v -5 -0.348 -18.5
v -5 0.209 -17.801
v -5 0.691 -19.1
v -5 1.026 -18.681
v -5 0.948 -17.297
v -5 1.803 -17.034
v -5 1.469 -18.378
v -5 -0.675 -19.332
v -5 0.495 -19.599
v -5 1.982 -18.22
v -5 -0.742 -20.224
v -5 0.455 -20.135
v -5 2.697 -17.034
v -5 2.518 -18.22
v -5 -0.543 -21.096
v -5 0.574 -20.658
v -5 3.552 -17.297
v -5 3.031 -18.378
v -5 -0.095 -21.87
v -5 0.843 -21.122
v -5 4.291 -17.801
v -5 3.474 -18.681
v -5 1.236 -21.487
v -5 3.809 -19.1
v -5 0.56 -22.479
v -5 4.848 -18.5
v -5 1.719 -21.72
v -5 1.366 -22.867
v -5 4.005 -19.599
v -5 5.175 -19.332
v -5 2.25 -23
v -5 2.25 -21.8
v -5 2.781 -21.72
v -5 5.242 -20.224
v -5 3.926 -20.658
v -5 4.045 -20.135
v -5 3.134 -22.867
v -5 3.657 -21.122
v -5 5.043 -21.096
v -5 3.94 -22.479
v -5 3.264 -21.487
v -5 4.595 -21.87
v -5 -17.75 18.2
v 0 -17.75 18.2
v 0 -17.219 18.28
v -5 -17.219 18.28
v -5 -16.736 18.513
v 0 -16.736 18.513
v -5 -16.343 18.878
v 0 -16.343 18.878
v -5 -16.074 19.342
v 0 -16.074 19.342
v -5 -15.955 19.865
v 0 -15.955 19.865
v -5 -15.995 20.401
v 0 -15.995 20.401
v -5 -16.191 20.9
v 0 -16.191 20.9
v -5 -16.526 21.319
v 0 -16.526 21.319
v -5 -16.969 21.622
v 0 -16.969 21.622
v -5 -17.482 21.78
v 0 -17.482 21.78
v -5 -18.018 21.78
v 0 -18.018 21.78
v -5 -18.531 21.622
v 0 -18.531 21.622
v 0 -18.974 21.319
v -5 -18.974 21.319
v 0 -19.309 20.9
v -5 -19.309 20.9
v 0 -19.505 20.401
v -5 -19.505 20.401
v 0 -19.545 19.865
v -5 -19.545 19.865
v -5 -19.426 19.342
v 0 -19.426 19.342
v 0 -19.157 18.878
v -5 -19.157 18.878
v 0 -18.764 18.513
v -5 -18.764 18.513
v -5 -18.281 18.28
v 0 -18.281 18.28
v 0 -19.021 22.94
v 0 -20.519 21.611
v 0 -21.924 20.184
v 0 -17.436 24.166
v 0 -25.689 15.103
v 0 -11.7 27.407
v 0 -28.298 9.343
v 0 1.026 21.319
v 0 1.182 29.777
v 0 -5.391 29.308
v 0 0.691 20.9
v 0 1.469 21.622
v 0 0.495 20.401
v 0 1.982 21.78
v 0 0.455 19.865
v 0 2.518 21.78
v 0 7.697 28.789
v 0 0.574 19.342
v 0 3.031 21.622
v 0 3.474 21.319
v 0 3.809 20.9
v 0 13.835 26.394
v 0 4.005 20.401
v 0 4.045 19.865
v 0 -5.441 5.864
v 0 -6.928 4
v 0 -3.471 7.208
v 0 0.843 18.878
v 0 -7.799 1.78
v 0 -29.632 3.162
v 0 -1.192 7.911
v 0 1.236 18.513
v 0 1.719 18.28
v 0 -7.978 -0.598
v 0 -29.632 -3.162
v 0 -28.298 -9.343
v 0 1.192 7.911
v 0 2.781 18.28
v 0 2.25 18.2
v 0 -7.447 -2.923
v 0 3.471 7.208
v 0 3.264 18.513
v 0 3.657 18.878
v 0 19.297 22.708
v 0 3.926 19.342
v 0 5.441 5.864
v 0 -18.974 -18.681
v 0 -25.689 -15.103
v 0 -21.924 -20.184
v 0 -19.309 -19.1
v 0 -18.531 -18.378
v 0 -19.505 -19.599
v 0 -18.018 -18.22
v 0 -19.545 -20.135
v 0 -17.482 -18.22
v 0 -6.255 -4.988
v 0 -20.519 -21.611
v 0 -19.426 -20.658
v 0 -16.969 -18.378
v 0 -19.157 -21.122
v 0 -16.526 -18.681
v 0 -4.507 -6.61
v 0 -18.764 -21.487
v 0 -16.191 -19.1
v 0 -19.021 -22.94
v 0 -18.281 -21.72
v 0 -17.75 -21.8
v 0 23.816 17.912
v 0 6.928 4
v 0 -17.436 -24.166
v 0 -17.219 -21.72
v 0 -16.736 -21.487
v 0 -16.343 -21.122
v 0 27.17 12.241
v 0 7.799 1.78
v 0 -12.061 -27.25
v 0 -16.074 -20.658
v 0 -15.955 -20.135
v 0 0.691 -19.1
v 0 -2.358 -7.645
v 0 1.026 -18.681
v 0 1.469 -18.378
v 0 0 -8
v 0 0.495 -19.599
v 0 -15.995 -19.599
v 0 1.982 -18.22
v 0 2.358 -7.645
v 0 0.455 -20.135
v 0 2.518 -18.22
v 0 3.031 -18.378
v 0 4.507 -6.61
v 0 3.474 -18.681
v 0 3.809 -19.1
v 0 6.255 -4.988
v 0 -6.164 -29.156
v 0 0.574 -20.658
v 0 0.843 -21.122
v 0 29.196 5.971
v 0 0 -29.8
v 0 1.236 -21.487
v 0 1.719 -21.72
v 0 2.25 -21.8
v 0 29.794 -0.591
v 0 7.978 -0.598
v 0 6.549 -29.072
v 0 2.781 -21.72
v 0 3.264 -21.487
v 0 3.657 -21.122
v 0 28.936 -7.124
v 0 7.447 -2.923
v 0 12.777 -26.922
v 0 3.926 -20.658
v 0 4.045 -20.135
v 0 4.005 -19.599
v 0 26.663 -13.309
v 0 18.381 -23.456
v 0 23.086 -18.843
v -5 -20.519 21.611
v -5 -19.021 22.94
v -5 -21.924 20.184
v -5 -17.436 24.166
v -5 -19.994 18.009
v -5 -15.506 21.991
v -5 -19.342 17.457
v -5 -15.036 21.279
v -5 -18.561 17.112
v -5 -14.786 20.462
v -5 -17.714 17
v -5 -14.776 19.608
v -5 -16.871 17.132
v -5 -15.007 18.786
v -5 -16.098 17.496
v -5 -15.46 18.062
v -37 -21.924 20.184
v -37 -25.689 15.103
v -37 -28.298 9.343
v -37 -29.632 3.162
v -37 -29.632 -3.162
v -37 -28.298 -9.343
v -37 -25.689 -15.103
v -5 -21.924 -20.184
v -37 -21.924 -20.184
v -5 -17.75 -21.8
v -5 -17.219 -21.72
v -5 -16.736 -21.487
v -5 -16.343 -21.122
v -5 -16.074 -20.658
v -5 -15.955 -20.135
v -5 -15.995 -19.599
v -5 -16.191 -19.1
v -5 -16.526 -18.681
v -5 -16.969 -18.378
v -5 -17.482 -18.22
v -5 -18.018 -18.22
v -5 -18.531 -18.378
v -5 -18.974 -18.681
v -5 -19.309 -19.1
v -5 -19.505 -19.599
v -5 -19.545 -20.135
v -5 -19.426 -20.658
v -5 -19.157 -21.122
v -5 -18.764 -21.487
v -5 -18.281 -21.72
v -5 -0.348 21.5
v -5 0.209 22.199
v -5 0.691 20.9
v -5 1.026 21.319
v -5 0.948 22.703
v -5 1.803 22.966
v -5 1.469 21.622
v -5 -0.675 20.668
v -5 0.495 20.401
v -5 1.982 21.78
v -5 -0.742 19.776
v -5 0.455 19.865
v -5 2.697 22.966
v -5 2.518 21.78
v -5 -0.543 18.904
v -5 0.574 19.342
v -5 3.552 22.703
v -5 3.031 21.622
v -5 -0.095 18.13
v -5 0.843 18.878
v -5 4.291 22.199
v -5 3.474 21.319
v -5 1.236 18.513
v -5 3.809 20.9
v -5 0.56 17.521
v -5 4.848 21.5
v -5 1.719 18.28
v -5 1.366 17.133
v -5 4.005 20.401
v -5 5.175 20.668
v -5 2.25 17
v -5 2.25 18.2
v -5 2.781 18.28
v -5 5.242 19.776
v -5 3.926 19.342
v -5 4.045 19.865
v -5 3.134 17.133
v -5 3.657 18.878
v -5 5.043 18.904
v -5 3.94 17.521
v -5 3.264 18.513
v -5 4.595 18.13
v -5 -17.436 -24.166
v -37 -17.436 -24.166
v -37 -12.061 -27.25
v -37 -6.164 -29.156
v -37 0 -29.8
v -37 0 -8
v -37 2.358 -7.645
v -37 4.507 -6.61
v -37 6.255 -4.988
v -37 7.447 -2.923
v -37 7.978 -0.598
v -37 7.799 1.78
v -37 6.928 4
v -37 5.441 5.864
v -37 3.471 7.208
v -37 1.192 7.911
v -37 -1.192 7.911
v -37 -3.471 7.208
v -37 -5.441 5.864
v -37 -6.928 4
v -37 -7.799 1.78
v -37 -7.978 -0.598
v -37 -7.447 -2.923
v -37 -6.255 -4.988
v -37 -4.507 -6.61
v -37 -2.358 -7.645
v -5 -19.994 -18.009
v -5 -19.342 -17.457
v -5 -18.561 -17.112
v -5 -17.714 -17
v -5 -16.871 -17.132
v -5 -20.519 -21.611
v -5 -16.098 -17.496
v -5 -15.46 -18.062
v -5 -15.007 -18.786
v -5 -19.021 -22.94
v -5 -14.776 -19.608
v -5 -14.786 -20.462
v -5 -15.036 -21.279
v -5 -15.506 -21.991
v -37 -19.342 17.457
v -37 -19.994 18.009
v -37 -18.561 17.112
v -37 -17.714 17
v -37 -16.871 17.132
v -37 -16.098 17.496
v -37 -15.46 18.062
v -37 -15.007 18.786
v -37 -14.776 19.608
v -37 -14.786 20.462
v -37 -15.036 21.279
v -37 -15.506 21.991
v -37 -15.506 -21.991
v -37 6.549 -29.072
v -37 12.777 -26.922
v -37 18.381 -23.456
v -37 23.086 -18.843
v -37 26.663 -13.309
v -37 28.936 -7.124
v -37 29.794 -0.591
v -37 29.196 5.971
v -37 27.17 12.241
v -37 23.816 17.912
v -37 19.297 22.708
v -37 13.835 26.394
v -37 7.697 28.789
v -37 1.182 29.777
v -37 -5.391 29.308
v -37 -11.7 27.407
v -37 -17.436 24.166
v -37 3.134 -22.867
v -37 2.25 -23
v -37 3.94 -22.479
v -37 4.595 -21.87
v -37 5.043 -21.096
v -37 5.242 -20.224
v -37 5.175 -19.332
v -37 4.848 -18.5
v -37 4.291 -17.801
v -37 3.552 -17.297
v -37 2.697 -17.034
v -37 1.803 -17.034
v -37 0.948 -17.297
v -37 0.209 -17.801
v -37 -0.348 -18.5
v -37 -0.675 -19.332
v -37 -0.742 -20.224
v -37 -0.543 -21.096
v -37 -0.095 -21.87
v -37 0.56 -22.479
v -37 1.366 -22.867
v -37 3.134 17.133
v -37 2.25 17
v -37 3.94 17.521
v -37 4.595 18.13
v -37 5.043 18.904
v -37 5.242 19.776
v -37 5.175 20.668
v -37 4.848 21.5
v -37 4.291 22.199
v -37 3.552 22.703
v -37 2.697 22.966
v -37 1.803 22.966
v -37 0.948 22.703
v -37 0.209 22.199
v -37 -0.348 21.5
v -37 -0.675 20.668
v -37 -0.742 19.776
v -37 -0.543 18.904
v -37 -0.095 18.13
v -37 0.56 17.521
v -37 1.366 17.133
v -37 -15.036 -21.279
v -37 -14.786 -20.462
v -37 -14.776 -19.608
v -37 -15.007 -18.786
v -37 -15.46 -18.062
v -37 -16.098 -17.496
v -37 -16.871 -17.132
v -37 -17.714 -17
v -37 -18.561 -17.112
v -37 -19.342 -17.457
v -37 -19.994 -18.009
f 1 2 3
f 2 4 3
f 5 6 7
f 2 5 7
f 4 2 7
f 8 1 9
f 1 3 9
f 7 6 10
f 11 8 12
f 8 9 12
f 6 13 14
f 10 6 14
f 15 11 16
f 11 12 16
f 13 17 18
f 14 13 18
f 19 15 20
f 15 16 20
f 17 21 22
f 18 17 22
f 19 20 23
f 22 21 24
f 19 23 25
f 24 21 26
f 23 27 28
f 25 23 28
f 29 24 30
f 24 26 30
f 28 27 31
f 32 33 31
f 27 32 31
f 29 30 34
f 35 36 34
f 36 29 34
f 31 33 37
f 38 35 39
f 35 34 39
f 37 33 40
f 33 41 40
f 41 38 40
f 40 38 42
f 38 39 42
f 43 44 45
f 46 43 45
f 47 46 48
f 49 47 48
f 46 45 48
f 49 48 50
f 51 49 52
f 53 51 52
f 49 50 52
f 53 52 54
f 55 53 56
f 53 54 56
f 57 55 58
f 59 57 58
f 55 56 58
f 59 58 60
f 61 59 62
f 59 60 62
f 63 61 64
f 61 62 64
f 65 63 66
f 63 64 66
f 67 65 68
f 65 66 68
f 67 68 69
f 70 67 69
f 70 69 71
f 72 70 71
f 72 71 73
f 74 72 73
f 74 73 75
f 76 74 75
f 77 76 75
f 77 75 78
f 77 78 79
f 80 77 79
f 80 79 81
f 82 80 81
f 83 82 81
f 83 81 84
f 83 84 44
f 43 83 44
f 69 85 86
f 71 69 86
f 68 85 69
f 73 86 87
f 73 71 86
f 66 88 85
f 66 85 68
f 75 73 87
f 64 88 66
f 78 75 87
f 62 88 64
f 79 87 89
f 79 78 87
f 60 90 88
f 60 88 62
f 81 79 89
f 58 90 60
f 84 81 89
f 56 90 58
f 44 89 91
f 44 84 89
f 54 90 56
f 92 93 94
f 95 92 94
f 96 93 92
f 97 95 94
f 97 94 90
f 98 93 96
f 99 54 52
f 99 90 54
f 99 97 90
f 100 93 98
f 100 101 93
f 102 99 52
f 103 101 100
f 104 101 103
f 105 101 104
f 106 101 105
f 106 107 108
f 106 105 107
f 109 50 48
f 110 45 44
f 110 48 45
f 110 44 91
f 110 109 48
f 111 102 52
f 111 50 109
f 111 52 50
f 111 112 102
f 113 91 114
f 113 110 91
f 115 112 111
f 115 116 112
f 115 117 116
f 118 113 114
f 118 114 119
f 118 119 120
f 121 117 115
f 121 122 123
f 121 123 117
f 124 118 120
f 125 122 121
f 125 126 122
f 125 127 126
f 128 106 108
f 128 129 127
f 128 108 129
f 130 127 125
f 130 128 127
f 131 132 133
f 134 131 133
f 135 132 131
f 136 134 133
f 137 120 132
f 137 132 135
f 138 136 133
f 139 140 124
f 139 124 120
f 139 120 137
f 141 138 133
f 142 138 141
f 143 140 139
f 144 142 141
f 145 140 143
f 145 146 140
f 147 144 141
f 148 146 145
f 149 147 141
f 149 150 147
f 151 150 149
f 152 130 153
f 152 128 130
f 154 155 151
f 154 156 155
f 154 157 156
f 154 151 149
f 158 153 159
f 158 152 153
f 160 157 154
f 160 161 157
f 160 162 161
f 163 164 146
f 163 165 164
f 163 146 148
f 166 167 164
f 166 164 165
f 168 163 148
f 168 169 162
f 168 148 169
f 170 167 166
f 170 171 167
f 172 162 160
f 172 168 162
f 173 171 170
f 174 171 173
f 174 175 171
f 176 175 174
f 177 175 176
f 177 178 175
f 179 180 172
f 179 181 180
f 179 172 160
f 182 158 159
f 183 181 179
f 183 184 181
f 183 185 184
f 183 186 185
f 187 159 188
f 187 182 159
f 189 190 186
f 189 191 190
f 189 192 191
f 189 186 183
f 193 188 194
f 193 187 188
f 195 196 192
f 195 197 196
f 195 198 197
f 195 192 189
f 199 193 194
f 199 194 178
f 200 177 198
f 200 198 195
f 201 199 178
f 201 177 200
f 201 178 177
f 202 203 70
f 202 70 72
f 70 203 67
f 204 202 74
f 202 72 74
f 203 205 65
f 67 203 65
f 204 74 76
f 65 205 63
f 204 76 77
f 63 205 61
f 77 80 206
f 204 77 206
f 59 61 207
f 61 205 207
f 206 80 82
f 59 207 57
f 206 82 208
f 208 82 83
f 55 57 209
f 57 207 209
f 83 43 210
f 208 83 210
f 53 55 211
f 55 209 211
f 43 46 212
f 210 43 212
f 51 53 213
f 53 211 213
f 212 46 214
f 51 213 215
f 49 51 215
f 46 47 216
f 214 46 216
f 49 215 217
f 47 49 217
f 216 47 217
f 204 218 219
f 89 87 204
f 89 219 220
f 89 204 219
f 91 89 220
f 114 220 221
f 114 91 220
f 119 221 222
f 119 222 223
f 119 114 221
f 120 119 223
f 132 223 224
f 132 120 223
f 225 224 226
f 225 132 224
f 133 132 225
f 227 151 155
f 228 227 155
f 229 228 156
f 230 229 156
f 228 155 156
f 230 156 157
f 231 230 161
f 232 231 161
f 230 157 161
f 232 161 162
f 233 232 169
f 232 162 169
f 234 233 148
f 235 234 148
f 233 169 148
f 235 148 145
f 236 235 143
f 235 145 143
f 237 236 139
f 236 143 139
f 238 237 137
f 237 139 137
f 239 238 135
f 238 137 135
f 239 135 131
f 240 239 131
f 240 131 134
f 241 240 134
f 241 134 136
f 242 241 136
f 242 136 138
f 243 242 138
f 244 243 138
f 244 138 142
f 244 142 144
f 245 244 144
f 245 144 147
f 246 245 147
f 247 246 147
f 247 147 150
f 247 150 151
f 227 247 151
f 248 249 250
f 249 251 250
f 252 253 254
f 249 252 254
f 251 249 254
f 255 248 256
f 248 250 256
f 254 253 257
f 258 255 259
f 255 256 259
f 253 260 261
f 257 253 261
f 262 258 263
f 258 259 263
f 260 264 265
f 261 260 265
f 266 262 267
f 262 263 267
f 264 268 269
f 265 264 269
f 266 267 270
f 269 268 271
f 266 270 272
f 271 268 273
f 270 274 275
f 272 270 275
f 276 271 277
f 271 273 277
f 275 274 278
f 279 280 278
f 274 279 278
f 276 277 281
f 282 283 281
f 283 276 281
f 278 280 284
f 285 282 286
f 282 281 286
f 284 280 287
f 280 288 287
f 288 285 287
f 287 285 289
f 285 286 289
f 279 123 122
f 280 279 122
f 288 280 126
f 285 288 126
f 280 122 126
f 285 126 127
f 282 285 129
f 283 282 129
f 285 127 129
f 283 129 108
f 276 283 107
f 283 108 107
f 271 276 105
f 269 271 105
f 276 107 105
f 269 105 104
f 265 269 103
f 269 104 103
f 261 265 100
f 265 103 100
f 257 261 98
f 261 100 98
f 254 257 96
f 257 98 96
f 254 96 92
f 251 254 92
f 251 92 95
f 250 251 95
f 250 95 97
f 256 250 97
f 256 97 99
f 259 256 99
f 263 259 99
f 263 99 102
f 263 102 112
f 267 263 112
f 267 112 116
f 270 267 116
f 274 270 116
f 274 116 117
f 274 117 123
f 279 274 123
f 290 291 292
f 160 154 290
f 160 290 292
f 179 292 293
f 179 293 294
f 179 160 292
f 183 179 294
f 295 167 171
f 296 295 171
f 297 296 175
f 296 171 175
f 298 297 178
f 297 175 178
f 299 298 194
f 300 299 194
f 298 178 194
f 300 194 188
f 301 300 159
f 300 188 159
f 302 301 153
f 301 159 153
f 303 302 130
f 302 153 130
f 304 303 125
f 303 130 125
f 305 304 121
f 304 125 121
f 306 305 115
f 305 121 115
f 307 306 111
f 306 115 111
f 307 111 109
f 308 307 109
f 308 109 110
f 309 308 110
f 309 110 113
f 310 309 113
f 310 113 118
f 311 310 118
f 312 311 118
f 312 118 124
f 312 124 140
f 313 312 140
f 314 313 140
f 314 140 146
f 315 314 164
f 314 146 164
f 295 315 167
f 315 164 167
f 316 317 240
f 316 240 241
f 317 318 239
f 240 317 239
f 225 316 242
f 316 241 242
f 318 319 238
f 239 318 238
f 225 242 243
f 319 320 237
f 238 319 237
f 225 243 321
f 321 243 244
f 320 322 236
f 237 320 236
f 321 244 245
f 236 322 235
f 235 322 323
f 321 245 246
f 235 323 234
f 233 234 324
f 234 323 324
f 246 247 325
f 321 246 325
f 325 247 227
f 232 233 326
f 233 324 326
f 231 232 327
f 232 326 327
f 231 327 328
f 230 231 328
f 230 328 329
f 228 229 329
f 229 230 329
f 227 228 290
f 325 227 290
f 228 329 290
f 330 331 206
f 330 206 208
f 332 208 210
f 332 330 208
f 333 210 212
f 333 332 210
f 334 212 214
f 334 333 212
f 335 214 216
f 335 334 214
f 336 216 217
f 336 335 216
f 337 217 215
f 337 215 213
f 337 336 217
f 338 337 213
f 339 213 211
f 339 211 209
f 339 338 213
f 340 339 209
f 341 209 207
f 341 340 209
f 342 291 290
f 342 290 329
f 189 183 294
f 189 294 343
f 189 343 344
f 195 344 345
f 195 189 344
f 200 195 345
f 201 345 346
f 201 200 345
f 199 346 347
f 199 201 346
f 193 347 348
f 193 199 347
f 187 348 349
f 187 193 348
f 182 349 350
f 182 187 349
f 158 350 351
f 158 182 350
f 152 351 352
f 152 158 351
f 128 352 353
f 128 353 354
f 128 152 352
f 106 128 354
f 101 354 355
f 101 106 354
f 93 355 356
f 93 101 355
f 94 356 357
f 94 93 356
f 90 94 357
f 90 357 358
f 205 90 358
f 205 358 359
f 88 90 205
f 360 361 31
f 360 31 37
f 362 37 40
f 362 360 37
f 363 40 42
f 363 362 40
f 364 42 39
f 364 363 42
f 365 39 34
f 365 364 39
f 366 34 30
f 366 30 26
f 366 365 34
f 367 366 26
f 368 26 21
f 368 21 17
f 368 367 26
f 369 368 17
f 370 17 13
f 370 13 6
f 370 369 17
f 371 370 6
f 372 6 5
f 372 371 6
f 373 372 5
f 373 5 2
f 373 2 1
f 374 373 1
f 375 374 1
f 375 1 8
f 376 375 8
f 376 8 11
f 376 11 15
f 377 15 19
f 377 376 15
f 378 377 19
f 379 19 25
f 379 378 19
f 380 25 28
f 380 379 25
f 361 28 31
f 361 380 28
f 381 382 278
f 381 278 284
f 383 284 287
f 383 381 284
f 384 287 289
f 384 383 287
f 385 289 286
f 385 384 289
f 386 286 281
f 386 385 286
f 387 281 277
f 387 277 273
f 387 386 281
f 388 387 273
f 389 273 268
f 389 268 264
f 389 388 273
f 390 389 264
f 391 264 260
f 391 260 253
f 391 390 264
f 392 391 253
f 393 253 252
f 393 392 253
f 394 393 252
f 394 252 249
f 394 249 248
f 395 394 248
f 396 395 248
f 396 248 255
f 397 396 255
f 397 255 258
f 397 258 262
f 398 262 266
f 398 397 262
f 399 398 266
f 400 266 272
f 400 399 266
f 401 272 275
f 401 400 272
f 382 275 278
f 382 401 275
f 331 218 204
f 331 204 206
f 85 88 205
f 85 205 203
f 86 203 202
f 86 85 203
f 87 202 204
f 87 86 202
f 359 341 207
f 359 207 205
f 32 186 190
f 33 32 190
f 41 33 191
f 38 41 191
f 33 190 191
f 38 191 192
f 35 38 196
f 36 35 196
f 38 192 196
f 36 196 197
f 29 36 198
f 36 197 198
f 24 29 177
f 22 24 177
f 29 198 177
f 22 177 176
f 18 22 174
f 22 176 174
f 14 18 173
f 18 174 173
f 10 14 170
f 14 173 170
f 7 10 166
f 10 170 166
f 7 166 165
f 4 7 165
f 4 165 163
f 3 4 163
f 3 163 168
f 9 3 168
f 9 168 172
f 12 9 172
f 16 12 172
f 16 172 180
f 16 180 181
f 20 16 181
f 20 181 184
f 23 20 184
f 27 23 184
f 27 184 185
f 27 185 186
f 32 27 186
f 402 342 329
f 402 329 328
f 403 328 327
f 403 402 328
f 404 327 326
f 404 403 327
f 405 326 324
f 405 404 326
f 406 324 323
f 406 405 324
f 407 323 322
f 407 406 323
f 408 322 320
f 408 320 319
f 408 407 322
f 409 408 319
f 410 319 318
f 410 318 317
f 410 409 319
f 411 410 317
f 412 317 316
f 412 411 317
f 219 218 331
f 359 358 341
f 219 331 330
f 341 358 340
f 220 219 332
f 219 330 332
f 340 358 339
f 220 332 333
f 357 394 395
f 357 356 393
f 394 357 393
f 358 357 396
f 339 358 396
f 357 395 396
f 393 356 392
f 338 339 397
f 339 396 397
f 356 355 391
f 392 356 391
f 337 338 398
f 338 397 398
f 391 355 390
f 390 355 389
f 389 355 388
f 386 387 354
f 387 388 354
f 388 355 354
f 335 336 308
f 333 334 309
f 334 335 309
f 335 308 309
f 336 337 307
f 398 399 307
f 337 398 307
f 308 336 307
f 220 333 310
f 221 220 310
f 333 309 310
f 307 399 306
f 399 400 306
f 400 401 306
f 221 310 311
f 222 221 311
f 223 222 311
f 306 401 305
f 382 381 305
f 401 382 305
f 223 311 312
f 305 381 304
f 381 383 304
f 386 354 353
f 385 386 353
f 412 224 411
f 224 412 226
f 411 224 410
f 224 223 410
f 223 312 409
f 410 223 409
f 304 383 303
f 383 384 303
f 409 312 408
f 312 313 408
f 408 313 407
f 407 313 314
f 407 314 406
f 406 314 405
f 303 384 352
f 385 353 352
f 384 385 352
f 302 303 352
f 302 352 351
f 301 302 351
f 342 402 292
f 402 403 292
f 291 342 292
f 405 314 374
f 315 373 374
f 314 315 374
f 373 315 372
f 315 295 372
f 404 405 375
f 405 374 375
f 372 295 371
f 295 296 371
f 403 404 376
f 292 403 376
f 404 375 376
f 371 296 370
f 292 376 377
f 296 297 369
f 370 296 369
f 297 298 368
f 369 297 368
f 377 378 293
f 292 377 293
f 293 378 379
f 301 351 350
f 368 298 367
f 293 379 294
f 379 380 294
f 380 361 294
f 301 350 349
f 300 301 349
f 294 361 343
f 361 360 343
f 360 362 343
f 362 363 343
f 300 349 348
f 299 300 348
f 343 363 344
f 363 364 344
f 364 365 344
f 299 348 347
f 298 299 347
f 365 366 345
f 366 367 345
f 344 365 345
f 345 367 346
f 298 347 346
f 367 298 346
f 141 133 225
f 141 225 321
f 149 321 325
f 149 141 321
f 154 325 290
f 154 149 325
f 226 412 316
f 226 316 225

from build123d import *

# Parameters (mm, degrees)
SKETCH2_R            = 3
SKETCH2_R_2          = 8
BOSS_EXTRUDE1_DEPTH  = 37
M4_CLEARANCE_HOLE1_D = 3.6
CUT_EXTRUDE1_START   = -37
SKETCH2_3_R          = 3
CUT_EXTRUDE1_DEPTH   = 32


with BuildPart() as part:
    # Sketch2 → Boss-Extrude1 (new body)
    # profile 1 of 5: a face of its own
    with BuildSketch(Plane(origin=(0, 0, 0), x_dir=(0, 0, -1), z_dir=(1, 0, 0))):
        with BuildLine():
            Line((-24.16628289, -17.436478179), (-21.991350056, -15.506225289))
            ThreePointArc((-21.991350056, -15.506225289), (-17.756225289, -15.758649944), (-18.008649944, -19.993774711))
            Line((-18.008649944, -19.993774711), (-20.183582778, -21.924027601))
            ThreePointArc((-20.183582778, -21.924027601), (0, -29.8), (20.183582778, -21.924027601))
            Line((20.183582778, -21.924027601), (18.008649944, -19.993774711))
            ThreePointArc((18.008649944, -19.993774711), (17.756225289, -15.758649944), (21.991350056, -15.506225289))
            Line((21.991350056, -15.506225289), (24.16628289, -17.436478179))
            ThreePointArc((24.16628289, -17.436478179), (28.356615014, -9.162007692), (29.8, 0))
            ThreePointArc((29.8, 0), (-9.162007692, 28.356615014), (-24.16628289, -17.436478179))
        make_face()
        with Locations((-20, 2.25)):
            Circle(SKETCH2_R, mode=Mode.SUBTRACT)
        Circle(SKETCH2_R_2, mode=Mode.SUBTRACT)
        with Locations((20, 2.25)):
            Circle(SKETCH2_R, mode=Mode.SUBTRACT)
    # profile 2 of 5: a face of its own
    with BuildSketch(Plane(origin=(0, 0, 0), x_dir=(0, 0, -1), z_dir=(1, 0, 0))):
        with Locations((20, 2.25)):
            Circle(SKETCH2_R)
    # profile 3 of 5: a face of its own
    with BuildSketch(Plane(origin=(0, 0, 0), x_dir=(0, 0, -1), z_dir=(1, 0, 0))):
        with Locations((-20, 2.25)):
            Circle(SKETCH2_R)
    # profile 4 of 5: a face of its own
    with BuildSketch(Plane(origin=(0, 0, 0), x_dir=(0, 0, -1), z_dir=(1, 0, 0))):
        with BuildLine():
            ThreePointArc((20.183582778, -21.924027601), (22.28816213, -19.78074389), (24.16628289, -17.436478179))
            Line((24.16628289, -17.436478179), (21.991350056, -15.506225289))
            ThreePointArc((21.991350056, -15.506225289), (17.756225289, -15.758649944), (18.008649944, -19.993774711))
            Line((18.008649944, -19.993774711), (20.183582778, -21.924027601))
        make_face()
    # profile 5 of 5: a face of its own
    with BuildSketch(Plane(origin=(0, 0, 0), x_dir=(0, 0, -1), z_dir=(1, 0, 0))):
        with BuildLine():
            ThreePointArc((-18.008649944, -19.993774711), (-17.756225289, -15.758649944), (-21.991350056, -15.506225289))
            Line((-21.991350056, -15.506225289), (-24.16628289, -17.436478179))
            ThreePointArc((-24.16628289, -17.436478179), (-22.28816213, -19.78074389), (-20.183582778, -21.924027601))
            Line((-20.183582778, -21.924027601), (-18.008649944, -19.993774711))
        make_face()
    extrude(amount=-BOSS_EXTRUDE1_DEPTH)

    # M4 Clearance Hole1 (through all)
    with Locations(Plane.ZY.offset(37)):
        with Locations((-20, 2.25), (20, 2.25), (20, -17.75), (-20, -17.75)):
            Hole(M4_CLEARANCE_HOLE1_D / 2)

    # Sketch2<3> → Cut-Extrude1 (cut)
    with BuildSketch(Plane(origin=(0, 0, 0), x_dir=(0, 0, -1), z_dir=(1, 0, 0)).offset(CUT_EXTRUDE1_START)):
        with Locations((20, 2.25)):
            Circle(SKETCH2_3_R)
        with Locations((-20, 2.25)):
            Circle(SKETCH2_3_R)
        with BuildLine():
            ThreePointArc((-18.008649944, -19.993774711), (-17.756225289, -15.758649944), (-21.991350056, -15.506225289))
            Line((-21.991350056, -15.506225289), (-24.16628289, -17.436478179))
            ThreePointArc((-24.16628289, -17.436478179), (-22.28816213, -19.78074389), (-20.183582778, -21.924027601))
            Line((-20.183582778, -21.924027601), (-18.008649944, -19.993774711))
        make_face()
        with BuildLine():
            ThreePointArc((20.183582778, -21.924027601), (22.28816213, -19.78074389), (24.16628289, -17.436478179))
            Line((24.16628289, -17.436478179), (21.991350056, -15.506225289))
            ThreePointArc((21.991350056, -15.506225289), (17.756225289, -15.758649944), (18.008649944, -19.993774711))
            Line((18.008649944, -19.993774711), (20.183582778, -21.924027601))
        make_face()
    extrude(amount=CUT_EXTRUDE1_DEPTH, mode=Mode.SUBTRACT)


solid = part.part
